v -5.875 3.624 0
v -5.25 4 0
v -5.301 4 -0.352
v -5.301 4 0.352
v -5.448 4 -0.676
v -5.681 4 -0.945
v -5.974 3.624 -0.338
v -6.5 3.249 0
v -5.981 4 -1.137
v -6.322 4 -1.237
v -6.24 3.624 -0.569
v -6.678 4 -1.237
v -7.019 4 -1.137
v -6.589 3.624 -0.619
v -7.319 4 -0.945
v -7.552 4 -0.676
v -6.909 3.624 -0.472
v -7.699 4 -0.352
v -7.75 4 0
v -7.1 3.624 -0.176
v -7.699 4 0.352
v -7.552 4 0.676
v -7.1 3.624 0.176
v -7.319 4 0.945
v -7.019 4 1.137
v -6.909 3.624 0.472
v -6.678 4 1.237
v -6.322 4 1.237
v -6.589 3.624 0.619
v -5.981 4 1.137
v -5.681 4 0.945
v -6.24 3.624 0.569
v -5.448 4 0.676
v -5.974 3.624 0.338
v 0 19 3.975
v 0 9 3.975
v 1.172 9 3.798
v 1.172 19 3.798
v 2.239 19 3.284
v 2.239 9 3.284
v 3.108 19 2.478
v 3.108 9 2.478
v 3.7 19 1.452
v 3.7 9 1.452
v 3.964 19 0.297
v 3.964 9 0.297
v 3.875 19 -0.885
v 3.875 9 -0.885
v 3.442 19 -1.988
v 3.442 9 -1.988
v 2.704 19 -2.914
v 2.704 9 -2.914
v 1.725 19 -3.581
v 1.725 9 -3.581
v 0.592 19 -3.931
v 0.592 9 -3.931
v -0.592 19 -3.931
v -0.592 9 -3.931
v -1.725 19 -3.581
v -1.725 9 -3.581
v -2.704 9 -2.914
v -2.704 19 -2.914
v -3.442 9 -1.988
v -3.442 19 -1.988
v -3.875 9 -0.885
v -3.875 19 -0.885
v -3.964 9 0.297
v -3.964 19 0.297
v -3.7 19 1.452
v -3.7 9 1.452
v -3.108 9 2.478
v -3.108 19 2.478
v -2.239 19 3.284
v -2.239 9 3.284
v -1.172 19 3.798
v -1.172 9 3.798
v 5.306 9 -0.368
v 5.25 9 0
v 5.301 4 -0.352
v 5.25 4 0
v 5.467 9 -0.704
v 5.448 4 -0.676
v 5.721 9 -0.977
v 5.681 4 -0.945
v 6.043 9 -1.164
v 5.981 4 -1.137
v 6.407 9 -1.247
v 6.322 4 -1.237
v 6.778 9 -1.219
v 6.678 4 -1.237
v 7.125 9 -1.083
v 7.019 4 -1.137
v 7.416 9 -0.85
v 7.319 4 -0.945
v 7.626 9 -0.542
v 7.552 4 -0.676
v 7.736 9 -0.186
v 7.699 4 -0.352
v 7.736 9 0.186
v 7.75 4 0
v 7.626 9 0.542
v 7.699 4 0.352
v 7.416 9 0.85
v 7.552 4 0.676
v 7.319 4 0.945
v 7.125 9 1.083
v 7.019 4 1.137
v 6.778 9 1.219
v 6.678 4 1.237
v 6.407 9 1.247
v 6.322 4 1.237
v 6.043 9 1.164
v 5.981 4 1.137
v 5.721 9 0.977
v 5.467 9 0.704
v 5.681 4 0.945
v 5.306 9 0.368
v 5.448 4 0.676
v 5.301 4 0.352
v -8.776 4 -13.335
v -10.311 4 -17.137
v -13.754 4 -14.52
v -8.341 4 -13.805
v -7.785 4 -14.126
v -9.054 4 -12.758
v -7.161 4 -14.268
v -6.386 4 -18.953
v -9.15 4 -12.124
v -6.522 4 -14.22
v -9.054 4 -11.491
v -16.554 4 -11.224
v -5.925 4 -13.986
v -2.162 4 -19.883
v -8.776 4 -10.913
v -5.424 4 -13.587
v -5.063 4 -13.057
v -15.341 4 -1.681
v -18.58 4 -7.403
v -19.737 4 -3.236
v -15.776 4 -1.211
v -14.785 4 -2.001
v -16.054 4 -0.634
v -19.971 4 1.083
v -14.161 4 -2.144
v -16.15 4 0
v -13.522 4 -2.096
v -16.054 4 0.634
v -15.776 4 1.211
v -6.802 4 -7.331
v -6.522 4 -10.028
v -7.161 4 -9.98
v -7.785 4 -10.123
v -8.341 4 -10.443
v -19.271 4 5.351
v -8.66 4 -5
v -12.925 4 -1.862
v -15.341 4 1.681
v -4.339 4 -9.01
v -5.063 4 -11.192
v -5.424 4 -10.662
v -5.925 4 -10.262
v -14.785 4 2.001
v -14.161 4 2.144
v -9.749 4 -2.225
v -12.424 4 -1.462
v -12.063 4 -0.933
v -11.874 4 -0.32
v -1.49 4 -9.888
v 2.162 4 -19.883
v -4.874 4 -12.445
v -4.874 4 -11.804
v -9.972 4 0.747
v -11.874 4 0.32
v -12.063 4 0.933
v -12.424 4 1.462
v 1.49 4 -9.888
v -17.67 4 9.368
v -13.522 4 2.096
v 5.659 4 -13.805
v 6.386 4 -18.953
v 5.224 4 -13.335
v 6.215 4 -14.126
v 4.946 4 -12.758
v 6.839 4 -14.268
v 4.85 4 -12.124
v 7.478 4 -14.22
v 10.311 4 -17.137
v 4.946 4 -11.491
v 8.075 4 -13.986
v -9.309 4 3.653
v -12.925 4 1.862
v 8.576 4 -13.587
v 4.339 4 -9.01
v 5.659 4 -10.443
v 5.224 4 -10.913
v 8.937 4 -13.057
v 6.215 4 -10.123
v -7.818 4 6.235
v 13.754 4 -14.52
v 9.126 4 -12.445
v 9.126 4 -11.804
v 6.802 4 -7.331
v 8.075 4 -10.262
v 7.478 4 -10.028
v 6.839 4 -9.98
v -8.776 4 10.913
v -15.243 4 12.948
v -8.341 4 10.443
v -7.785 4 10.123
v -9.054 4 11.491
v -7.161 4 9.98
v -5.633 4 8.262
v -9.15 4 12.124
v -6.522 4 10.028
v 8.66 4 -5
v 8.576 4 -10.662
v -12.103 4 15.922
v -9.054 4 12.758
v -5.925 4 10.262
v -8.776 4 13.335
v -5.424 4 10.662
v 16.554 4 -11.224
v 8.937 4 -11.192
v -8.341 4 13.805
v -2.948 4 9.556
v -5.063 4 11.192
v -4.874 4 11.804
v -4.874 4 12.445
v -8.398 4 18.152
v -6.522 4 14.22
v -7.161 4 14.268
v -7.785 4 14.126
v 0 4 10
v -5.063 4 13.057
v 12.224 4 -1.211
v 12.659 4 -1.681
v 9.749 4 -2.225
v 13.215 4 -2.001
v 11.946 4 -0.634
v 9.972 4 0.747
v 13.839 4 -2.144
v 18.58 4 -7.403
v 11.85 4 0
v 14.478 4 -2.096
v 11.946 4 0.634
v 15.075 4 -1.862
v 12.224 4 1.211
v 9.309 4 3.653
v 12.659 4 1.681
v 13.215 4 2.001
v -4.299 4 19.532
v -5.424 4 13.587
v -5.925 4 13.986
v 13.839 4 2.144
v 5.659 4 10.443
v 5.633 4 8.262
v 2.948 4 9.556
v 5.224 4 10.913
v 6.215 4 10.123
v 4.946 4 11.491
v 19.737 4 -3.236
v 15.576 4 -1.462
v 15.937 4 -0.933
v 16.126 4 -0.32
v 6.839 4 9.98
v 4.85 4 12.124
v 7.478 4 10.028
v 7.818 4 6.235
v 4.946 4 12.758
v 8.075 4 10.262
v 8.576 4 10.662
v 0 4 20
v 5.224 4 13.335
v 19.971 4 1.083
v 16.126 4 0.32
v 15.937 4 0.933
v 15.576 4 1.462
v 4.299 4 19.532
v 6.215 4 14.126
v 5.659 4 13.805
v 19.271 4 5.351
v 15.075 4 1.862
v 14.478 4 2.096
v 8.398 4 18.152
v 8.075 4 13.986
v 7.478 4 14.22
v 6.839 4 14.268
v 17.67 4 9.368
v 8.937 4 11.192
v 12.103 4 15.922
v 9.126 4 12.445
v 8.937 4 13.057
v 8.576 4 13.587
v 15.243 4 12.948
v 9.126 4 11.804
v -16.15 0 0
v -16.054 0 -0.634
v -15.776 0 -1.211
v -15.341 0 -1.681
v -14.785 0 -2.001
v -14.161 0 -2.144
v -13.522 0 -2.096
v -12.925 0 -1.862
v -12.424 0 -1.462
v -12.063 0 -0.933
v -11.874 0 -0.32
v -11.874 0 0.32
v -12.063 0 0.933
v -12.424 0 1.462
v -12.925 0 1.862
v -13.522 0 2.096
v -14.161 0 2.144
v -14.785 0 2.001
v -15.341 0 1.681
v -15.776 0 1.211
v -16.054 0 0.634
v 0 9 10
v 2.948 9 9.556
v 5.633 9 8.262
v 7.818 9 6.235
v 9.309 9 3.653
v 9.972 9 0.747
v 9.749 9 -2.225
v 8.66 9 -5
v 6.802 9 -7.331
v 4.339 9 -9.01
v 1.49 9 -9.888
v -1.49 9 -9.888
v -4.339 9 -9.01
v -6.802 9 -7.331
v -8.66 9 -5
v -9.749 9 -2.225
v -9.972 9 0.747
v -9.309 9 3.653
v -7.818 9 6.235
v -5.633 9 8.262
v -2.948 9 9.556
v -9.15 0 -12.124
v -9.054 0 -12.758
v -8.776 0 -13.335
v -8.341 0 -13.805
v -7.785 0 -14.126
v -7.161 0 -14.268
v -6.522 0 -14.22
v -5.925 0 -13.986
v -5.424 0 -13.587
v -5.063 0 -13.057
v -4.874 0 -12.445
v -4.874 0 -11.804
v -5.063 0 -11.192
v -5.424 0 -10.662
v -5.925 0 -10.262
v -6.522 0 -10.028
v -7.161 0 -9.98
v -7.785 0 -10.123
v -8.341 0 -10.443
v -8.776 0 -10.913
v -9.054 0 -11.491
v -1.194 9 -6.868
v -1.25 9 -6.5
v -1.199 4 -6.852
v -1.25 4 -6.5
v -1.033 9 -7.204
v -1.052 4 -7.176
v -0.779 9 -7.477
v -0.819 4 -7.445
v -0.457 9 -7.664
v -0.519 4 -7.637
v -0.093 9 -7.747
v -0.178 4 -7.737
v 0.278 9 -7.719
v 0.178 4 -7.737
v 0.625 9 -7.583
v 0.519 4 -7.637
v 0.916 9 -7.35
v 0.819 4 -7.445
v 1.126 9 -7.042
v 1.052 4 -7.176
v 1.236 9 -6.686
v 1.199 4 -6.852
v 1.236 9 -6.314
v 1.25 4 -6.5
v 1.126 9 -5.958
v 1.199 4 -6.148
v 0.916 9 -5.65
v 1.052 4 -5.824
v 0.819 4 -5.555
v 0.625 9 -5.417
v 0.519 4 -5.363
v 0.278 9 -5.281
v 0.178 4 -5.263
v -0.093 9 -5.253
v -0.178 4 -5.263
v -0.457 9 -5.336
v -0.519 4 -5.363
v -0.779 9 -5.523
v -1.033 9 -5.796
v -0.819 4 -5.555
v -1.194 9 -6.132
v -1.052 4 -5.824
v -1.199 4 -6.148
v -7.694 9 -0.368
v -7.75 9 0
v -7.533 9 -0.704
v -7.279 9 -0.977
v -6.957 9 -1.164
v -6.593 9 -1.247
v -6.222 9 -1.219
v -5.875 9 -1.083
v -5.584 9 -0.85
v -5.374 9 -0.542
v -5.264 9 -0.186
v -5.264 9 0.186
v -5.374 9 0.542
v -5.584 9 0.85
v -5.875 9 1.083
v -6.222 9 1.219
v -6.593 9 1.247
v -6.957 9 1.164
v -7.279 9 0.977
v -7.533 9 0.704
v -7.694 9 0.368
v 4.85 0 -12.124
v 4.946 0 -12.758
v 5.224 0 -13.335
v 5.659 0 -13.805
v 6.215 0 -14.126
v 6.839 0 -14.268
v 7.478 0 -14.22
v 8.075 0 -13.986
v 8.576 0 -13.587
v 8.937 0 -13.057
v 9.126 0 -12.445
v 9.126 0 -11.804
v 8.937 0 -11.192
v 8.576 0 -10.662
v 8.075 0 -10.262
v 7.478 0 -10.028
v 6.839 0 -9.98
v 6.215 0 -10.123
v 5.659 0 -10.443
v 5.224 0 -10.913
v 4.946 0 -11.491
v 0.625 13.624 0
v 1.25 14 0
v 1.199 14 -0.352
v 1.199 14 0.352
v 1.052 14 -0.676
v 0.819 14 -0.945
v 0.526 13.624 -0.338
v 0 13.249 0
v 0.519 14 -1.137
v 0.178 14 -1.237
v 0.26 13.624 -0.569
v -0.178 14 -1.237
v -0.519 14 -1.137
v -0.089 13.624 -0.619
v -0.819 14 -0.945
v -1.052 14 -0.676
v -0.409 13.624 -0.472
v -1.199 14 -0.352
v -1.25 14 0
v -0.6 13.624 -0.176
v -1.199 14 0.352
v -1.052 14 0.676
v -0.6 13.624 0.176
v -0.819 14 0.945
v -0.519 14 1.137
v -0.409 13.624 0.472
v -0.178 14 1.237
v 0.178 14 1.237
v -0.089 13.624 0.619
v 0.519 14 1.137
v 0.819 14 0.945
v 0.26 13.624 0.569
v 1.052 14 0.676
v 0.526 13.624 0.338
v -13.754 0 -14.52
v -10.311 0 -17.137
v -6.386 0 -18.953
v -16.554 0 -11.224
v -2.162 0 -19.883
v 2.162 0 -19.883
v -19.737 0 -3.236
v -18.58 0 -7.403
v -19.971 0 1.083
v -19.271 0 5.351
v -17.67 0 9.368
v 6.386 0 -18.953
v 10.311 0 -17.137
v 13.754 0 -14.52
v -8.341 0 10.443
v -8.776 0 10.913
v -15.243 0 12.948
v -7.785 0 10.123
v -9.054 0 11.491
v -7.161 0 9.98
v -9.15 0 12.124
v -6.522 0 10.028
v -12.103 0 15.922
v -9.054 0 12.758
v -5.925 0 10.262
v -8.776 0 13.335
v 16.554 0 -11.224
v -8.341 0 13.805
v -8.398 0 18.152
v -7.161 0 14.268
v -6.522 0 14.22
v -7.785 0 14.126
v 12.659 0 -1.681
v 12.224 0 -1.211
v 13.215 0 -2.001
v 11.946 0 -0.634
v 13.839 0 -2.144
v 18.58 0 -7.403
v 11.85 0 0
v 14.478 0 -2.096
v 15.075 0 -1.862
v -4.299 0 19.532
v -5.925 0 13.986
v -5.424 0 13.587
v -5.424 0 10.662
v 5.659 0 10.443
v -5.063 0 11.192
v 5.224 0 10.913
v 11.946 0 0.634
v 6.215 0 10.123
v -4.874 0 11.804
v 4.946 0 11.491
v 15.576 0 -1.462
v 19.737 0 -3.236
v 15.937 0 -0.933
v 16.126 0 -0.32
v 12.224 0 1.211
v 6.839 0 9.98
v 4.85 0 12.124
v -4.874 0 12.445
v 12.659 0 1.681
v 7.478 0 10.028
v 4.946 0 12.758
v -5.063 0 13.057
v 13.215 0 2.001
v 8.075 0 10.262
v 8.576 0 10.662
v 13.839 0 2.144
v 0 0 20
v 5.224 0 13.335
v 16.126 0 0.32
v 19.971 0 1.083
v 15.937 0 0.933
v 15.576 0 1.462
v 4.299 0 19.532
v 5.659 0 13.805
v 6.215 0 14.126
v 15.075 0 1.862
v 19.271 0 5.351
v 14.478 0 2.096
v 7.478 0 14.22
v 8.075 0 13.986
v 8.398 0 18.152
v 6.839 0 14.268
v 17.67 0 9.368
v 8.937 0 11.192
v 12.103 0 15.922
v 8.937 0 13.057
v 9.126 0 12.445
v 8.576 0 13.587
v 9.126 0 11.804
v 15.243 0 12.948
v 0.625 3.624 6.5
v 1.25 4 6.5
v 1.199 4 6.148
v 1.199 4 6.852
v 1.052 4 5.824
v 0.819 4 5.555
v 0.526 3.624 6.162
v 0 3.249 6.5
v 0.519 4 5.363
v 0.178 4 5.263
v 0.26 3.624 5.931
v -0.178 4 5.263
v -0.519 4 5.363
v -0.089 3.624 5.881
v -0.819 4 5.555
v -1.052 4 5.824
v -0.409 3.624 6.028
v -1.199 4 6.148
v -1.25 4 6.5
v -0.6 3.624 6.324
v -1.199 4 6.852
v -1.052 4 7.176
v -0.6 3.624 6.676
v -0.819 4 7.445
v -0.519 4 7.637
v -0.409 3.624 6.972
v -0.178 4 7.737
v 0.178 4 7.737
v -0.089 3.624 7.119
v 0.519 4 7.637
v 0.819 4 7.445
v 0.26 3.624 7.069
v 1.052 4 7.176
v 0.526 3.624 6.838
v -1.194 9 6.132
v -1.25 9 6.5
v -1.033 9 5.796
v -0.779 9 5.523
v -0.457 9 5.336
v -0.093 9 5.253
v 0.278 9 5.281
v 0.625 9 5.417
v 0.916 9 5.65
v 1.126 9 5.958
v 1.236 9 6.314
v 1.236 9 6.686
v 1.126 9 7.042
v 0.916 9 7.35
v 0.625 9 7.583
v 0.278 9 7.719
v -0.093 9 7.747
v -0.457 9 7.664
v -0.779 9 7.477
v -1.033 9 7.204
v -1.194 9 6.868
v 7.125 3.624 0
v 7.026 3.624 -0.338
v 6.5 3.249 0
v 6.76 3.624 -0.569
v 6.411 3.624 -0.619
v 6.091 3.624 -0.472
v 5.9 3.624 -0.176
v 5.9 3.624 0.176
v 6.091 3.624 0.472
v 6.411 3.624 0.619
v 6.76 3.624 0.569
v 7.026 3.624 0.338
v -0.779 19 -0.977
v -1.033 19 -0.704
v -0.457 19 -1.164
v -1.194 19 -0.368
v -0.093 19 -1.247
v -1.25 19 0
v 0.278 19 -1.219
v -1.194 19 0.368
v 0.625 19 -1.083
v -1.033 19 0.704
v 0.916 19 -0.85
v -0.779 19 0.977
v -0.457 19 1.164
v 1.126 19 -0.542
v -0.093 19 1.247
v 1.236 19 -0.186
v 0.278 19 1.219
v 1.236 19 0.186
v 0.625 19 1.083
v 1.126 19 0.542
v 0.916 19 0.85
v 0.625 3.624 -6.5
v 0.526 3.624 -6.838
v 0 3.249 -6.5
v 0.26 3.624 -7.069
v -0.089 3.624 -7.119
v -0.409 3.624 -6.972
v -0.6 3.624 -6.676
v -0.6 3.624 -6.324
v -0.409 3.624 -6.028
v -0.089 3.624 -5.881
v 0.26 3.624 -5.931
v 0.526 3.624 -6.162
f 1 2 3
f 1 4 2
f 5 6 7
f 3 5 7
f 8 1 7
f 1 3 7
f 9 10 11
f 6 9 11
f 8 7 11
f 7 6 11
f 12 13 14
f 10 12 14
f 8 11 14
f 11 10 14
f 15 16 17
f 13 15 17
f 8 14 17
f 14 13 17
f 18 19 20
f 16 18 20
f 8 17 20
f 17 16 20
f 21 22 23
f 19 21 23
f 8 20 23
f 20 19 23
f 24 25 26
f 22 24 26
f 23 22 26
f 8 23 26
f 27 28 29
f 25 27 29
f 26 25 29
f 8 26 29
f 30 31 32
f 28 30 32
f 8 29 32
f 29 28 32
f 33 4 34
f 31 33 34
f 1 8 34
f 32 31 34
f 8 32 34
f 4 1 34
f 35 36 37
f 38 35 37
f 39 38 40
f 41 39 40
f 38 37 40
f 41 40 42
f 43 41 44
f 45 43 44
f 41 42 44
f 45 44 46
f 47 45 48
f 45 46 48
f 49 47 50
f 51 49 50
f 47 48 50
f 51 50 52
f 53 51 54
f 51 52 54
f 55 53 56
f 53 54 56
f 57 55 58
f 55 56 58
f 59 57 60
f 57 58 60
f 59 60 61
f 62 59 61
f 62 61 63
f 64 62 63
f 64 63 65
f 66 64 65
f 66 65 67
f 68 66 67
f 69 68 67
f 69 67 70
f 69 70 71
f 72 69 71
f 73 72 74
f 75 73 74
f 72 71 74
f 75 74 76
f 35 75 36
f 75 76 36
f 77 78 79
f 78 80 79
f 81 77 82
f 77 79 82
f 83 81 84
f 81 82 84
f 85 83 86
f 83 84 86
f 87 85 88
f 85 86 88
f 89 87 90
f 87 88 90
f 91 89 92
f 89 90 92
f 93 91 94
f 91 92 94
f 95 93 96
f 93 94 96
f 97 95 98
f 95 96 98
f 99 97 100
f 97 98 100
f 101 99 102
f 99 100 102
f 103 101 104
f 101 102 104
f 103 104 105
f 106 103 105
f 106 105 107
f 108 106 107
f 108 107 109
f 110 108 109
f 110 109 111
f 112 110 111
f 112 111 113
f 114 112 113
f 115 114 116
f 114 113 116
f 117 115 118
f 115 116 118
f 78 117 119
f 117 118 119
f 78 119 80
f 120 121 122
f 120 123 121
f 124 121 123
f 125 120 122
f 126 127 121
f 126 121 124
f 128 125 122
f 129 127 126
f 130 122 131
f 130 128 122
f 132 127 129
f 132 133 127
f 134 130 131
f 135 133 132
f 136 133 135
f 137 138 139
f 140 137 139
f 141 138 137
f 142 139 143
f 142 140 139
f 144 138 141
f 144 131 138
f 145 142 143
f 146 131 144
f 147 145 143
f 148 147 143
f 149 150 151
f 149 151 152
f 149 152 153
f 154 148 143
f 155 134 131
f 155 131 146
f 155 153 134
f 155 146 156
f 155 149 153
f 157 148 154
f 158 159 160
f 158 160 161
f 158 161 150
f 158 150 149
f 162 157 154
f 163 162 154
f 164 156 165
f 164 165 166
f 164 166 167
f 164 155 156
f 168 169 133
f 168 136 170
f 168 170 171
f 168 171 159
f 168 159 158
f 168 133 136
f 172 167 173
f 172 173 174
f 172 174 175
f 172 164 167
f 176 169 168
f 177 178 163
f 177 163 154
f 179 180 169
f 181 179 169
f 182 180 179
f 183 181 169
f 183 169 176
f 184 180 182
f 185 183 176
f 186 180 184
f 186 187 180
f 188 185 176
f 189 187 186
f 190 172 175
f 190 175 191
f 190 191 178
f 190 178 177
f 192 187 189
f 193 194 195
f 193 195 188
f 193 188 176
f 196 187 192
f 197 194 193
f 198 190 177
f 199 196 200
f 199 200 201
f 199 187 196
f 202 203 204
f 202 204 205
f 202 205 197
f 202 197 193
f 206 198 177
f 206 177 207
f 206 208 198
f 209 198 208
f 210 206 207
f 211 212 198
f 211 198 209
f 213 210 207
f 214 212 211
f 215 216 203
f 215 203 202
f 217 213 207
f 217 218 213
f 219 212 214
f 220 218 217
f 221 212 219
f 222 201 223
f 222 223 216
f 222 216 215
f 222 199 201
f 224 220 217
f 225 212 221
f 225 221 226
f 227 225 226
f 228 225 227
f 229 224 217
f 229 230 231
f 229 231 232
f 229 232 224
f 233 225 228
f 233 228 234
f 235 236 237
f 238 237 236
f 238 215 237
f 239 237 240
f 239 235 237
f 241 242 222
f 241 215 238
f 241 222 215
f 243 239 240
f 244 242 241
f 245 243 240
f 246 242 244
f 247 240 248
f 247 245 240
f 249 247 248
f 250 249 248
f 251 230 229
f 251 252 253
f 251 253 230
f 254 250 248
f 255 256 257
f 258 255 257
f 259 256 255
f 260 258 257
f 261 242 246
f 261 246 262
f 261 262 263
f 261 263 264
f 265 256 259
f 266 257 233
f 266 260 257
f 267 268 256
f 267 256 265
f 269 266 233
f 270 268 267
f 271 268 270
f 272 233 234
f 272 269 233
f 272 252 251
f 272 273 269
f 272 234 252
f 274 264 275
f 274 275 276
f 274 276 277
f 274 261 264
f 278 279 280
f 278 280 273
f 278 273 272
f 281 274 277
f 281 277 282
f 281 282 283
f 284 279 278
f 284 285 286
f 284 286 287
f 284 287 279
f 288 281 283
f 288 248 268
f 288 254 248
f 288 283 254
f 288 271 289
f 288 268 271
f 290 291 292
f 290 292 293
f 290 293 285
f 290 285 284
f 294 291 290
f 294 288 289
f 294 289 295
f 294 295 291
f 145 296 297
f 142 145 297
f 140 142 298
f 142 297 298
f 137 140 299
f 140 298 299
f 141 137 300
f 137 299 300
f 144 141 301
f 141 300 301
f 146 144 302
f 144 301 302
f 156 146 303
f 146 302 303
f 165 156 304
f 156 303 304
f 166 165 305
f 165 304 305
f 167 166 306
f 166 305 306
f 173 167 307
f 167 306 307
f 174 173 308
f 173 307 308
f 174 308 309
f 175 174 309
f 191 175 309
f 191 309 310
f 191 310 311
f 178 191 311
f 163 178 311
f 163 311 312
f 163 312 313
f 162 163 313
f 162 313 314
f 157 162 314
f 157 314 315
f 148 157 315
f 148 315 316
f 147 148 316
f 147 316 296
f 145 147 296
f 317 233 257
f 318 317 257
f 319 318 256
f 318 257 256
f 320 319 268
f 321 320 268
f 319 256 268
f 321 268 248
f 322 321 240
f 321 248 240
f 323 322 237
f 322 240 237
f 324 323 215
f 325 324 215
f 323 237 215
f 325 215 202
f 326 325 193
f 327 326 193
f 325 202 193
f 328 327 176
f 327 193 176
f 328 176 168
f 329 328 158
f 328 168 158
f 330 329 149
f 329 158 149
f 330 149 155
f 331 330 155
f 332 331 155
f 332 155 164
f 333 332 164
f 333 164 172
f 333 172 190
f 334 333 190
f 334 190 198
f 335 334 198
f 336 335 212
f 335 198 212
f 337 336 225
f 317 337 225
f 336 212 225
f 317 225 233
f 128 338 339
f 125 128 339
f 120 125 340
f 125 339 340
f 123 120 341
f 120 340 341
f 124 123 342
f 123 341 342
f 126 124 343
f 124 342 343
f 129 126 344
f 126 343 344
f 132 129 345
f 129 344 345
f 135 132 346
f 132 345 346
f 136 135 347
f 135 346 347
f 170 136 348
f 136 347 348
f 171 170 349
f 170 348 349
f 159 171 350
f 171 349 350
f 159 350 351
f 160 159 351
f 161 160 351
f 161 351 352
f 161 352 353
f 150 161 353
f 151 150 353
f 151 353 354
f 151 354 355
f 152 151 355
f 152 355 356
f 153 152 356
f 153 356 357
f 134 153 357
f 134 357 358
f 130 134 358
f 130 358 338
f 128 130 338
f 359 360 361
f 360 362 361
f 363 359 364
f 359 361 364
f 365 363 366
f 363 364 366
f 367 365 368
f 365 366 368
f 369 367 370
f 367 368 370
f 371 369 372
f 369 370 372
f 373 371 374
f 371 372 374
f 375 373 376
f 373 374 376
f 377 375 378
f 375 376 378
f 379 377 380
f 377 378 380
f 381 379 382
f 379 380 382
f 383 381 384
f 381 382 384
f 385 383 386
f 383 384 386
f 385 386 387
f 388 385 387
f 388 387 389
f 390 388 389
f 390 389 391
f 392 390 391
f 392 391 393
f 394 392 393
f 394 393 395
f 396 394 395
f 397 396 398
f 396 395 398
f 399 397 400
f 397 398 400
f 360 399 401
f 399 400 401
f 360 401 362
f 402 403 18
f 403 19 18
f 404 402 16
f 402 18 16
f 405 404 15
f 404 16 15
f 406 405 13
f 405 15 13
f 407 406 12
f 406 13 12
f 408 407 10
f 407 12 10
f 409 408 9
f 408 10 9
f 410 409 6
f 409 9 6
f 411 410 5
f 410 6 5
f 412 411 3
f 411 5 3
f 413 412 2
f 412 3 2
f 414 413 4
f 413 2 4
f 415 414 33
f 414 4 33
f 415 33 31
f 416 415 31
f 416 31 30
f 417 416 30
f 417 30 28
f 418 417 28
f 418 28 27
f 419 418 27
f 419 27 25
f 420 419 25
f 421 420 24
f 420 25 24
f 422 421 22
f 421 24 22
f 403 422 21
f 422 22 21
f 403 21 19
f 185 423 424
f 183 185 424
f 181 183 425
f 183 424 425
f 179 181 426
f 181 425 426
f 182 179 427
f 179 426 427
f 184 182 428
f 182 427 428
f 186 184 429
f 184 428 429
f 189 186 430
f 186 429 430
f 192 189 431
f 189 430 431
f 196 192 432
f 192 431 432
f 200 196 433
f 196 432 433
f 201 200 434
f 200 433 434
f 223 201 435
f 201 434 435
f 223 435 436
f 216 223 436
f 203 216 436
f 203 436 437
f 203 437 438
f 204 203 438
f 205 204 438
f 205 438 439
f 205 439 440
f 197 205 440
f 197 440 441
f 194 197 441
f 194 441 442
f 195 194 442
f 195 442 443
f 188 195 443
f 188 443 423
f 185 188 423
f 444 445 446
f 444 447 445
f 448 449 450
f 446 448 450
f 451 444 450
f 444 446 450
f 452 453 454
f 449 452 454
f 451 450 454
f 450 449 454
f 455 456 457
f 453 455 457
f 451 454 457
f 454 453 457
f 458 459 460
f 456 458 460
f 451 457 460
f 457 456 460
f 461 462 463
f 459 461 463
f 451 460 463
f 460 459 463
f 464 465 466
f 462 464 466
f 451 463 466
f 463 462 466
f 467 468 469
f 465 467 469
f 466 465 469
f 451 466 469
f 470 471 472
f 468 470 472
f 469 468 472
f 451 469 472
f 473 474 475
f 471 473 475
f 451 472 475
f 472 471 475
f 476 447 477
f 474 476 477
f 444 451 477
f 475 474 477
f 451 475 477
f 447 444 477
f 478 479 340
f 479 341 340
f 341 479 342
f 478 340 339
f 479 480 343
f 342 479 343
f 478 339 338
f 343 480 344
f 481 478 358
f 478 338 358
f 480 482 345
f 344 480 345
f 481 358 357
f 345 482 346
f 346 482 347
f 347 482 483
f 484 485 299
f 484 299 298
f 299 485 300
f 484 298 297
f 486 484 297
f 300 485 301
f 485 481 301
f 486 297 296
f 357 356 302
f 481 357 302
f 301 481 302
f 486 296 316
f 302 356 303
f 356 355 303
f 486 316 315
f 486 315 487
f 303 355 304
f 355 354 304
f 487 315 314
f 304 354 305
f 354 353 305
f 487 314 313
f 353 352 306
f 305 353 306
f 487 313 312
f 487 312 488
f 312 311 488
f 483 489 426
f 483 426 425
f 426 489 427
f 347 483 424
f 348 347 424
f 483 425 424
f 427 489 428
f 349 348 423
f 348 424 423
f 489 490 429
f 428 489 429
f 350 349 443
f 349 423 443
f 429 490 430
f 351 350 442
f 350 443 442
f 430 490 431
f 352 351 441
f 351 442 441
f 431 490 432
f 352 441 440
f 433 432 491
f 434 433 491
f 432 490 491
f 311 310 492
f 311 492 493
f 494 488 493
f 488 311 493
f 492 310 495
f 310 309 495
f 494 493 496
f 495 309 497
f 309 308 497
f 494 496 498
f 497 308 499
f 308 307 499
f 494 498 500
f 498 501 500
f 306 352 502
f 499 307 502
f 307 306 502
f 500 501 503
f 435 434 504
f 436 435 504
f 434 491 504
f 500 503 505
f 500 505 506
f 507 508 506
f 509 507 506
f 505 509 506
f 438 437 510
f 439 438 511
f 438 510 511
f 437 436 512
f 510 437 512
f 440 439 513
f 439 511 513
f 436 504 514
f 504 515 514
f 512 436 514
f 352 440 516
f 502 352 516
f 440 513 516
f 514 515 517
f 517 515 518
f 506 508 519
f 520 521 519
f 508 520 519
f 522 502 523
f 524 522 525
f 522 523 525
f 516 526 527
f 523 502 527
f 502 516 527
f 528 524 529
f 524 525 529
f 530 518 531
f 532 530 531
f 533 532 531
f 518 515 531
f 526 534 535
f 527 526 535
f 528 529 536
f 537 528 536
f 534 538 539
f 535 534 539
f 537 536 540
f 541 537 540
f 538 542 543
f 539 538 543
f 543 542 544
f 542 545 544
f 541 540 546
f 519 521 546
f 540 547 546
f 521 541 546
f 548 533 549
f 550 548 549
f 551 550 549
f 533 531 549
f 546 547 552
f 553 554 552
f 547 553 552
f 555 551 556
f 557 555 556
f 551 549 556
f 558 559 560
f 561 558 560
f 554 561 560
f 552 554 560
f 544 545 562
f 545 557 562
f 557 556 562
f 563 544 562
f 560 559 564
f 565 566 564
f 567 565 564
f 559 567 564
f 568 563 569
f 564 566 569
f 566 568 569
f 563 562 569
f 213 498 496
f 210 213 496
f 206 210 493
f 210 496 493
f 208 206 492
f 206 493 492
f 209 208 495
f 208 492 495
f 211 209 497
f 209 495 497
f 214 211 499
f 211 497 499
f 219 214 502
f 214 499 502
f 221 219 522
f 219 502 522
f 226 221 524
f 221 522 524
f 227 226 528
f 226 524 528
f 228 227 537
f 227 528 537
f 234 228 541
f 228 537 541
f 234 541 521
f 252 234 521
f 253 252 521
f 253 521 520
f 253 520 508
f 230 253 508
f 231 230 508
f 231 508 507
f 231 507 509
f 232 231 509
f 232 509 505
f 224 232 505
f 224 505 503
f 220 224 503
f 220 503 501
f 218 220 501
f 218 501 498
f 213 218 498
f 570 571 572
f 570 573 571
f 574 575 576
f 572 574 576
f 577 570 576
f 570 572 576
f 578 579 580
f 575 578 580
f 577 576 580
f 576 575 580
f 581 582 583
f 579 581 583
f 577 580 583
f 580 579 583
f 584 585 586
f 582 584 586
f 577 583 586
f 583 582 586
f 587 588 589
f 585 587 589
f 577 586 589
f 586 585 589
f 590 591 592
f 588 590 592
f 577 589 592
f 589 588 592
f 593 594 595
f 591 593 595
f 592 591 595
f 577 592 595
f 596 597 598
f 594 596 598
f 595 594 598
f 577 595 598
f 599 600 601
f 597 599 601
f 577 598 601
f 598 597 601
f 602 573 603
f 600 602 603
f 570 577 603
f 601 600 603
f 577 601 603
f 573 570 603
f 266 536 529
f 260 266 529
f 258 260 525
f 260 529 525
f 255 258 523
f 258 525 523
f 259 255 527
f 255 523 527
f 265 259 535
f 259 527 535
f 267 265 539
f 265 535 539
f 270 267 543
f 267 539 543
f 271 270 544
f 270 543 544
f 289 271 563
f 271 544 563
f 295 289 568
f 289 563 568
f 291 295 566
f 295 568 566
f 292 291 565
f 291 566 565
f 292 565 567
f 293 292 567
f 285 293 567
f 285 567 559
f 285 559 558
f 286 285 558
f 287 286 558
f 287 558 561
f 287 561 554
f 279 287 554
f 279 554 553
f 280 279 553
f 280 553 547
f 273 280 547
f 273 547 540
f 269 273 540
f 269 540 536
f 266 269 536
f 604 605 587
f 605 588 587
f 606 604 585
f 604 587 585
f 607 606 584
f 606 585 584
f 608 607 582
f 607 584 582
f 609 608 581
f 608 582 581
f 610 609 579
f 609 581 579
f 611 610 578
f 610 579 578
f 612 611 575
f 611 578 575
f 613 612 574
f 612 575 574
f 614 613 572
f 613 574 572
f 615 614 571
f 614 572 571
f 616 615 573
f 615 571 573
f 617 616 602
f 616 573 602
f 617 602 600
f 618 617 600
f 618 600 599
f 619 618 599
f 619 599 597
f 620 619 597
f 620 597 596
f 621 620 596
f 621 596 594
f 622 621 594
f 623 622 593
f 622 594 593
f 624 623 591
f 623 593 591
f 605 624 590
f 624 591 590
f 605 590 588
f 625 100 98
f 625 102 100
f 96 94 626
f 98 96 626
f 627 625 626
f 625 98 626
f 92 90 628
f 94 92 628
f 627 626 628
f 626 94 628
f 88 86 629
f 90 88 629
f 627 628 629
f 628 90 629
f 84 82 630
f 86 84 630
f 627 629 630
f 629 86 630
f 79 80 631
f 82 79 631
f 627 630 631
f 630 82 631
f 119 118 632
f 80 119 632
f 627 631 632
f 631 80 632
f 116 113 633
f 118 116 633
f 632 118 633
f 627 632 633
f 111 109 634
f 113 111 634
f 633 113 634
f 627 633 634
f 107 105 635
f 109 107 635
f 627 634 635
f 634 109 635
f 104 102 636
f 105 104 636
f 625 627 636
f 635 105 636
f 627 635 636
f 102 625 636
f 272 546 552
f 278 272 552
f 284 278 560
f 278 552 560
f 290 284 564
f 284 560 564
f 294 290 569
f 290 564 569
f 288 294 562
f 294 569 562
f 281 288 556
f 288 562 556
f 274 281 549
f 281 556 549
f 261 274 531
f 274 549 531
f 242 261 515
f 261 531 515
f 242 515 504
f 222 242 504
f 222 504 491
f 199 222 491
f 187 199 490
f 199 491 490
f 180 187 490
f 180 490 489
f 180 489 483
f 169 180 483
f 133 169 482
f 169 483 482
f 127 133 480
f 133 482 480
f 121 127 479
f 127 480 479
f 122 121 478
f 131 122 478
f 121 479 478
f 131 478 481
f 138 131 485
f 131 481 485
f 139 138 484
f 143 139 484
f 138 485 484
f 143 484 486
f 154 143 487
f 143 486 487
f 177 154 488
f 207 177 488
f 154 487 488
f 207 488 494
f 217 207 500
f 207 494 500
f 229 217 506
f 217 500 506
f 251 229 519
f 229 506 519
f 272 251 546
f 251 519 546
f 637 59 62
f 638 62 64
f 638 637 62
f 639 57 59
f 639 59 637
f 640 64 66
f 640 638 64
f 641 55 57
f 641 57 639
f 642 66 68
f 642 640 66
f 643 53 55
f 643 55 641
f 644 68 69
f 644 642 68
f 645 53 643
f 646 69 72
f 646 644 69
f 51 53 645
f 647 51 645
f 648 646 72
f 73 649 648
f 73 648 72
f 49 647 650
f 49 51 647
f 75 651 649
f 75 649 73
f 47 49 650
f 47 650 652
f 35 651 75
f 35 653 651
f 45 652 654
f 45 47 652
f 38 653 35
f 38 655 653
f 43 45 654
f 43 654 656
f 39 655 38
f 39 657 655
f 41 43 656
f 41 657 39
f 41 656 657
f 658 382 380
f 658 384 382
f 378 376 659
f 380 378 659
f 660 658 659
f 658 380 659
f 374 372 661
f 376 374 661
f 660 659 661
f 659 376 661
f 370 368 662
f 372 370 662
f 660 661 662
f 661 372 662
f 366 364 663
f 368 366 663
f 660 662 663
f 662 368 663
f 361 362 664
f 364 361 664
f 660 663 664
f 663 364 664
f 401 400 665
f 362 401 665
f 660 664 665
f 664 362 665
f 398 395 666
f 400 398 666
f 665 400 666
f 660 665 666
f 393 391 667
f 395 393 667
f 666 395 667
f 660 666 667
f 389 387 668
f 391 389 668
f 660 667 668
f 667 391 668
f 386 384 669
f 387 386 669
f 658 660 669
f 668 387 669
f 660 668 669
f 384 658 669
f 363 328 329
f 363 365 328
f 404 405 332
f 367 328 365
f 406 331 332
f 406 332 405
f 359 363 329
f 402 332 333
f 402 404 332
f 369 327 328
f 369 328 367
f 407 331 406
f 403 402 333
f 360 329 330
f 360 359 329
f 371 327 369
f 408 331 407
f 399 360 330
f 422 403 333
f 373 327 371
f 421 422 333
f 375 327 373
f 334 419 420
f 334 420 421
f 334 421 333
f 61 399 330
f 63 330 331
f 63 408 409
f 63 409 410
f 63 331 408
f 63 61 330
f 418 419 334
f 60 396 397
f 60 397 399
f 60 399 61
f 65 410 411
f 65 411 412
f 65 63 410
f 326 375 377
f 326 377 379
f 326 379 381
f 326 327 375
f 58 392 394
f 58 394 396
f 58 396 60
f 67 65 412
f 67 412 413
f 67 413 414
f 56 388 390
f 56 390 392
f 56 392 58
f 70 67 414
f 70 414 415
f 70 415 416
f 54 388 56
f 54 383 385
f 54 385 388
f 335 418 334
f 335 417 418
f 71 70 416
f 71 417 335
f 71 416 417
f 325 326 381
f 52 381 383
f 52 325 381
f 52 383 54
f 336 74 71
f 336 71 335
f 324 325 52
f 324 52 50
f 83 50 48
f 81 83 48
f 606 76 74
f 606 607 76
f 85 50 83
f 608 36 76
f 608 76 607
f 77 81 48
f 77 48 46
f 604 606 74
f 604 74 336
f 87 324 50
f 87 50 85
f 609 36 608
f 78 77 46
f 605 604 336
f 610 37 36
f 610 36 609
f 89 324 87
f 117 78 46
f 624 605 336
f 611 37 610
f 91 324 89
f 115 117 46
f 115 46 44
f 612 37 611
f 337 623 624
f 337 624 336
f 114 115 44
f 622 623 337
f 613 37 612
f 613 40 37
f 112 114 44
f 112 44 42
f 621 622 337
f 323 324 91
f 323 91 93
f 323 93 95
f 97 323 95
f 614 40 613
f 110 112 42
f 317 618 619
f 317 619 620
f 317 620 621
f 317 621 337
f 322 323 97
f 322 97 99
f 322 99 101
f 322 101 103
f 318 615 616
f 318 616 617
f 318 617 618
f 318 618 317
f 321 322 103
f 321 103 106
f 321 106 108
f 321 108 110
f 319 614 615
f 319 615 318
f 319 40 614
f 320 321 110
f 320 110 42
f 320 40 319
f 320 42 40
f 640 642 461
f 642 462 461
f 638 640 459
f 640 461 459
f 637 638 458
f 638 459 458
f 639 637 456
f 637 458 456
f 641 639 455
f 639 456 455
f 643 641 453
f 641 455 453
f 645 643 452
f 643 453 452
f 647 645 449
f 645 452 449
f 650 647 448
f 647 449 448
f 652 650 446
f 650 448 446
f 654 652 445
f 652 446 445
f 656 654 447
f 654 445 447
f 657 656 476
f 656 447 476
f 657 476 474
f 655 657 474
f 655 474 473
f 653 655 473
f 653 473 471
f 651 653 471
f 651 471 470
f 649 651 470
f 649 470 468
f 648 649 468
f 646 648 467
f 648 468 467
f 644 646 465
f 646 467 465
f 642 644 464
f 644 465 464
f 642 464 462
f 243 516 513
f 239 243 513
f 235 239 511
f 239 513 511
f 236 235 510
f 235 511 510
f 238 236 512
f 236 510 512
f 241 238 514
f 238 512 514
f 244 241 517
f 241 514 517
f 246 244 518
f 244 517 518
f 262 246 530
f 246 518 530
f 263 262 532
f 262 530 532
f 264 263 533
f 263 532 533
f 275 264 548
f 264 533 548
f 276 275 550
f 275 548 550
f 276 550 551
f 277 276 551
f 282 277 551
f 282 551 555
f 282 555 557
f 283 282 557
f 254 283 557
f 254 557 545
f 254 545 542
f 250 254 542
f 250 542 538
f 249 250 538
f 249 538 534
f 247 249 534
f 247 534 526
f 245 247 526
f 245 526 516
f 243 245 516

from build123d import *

# Parameters (mm, degrees)
SKETCH1_R             = 20
BOSS_EXTRUDE1_DEPTH   = 4
SKETCH2_R             = 10
BOSS_EXTRUDE2_DEPTH   = 5
SKETCH4_R             = 3.975
BOSS_EXTRUDE3_DEPTH   = 10
M4_CLEARANCE_HOLE2_D  = 4.3
M3_TAPPED_HOLE1_D     = 2.5
M3_TAPPED_HOLE1_DEPTH = 5
M3_TAPPED_HOLE1_TIP   = 0.751075774
M3_TAPPED_HOLE2_D     = 2.5
M3_TAPPED_HOLE2_DEPTH = 5
M3_TAPPED_HOLE2_TIP   = 0.751075774


with BuildPart() as part:
    # Sketch1 → Boss-Extrude1 (new body)
    with BuildSketch(Plane(origin=(0, 0, 0), x_dir=(1, 0, 0), z_dir=(0, 1, 0))):
        with Locations(Location((0, 0, 0), (0, 0, 270))):
            Circle(SKETCH1_R)
    extrude(amount=BOSS_EXTRUDE1_DEPTH)

    # Sketch2 → Boss-Extrude2 (add)
    with BuildSketch(Plane(origin=(0, 4, 0), x_dir=(1, 0, 0), z_dir=(0, 1, 0))):
        with Locations(Location((0, 0, 0), (0, 0, 270))):
            Circle(SKETCH2_R)
    extrude(amount=BOSS_EXTRUDE2_DEPTH)

    # Sketch4 → Boss-Extrude3 (add)
    with BuildSketch(Plane(origin=(0, 9, 0), x_dir=(1, 0, 0), z_dir=(0, 1, 0))):
        with Locations(Location((0, 0, 0), (0, 0, 270))):
            Circle(SKETCH4_R)
    extrude(amount=BOSS_EXTRUDE3_DEPTH)

    # M4 Clearance Hole2 (through all)
    with Locations(Plane(origin=(0, 4, 0), x_dir=(1, 0, 0), z_dir=(0, 1, 0))):
        with Locations((-14, 0), (-7, 12.124355653), (7, 12.124355653), (14, 0), (7, -12.124355653), (-7, -12.124355653)):
            Hole(M4_CLEARANCE_HOLE2_D / 2)

    # M3 Tapped Hole1
    with Locations(Plane(origin=(0, 9, 0), x_dir=(1, 0, 0), z_dir=(0, 1, 0))):
        with Locations((-6.5, 0), (0, 6.5), (6.5, 0), (0, -6.5)):
            Hole(M3_TAPPED_HOLE1_D / 2, depth=M3_TAPPED_HOLE1_DEPTH)
            with Locations((0, 0, -(M3_TAPPED_HOLE1_DEPTH + M3_TAPPED_HOLE1_TIP / 2))):  # 118° drill point
                Cone(0, M3_TAPPED_HOLE1_D / 2, M3_TAPPED_HOLE1_TIP, mode=Mode.SUBTRACT)

    # M3 Tapped Hole2
    with Locations(Plane(origin=(0, 19, 0), x_dir=(1, 0, 0), z_dir=(0, 1, 0))):
        with Locations((0, 0)):
            Hole(M3_TAPPED_HOLE2_D / 2, depth=M3_TAPPED_HOLE2_DEPTH)
            with Locations((0, 0, -(M3_TAPPED_HOLE2_DEPTH + M3_TAPPED_HOLE2_TIP / 2))):  # 118° drill point
                Cone(0, M3_TAPPED_HOLE2_D / 2, M3_TAPPED_HOLE2_TIP, mode=Mode.SUBTRACT)


solid = part.part
